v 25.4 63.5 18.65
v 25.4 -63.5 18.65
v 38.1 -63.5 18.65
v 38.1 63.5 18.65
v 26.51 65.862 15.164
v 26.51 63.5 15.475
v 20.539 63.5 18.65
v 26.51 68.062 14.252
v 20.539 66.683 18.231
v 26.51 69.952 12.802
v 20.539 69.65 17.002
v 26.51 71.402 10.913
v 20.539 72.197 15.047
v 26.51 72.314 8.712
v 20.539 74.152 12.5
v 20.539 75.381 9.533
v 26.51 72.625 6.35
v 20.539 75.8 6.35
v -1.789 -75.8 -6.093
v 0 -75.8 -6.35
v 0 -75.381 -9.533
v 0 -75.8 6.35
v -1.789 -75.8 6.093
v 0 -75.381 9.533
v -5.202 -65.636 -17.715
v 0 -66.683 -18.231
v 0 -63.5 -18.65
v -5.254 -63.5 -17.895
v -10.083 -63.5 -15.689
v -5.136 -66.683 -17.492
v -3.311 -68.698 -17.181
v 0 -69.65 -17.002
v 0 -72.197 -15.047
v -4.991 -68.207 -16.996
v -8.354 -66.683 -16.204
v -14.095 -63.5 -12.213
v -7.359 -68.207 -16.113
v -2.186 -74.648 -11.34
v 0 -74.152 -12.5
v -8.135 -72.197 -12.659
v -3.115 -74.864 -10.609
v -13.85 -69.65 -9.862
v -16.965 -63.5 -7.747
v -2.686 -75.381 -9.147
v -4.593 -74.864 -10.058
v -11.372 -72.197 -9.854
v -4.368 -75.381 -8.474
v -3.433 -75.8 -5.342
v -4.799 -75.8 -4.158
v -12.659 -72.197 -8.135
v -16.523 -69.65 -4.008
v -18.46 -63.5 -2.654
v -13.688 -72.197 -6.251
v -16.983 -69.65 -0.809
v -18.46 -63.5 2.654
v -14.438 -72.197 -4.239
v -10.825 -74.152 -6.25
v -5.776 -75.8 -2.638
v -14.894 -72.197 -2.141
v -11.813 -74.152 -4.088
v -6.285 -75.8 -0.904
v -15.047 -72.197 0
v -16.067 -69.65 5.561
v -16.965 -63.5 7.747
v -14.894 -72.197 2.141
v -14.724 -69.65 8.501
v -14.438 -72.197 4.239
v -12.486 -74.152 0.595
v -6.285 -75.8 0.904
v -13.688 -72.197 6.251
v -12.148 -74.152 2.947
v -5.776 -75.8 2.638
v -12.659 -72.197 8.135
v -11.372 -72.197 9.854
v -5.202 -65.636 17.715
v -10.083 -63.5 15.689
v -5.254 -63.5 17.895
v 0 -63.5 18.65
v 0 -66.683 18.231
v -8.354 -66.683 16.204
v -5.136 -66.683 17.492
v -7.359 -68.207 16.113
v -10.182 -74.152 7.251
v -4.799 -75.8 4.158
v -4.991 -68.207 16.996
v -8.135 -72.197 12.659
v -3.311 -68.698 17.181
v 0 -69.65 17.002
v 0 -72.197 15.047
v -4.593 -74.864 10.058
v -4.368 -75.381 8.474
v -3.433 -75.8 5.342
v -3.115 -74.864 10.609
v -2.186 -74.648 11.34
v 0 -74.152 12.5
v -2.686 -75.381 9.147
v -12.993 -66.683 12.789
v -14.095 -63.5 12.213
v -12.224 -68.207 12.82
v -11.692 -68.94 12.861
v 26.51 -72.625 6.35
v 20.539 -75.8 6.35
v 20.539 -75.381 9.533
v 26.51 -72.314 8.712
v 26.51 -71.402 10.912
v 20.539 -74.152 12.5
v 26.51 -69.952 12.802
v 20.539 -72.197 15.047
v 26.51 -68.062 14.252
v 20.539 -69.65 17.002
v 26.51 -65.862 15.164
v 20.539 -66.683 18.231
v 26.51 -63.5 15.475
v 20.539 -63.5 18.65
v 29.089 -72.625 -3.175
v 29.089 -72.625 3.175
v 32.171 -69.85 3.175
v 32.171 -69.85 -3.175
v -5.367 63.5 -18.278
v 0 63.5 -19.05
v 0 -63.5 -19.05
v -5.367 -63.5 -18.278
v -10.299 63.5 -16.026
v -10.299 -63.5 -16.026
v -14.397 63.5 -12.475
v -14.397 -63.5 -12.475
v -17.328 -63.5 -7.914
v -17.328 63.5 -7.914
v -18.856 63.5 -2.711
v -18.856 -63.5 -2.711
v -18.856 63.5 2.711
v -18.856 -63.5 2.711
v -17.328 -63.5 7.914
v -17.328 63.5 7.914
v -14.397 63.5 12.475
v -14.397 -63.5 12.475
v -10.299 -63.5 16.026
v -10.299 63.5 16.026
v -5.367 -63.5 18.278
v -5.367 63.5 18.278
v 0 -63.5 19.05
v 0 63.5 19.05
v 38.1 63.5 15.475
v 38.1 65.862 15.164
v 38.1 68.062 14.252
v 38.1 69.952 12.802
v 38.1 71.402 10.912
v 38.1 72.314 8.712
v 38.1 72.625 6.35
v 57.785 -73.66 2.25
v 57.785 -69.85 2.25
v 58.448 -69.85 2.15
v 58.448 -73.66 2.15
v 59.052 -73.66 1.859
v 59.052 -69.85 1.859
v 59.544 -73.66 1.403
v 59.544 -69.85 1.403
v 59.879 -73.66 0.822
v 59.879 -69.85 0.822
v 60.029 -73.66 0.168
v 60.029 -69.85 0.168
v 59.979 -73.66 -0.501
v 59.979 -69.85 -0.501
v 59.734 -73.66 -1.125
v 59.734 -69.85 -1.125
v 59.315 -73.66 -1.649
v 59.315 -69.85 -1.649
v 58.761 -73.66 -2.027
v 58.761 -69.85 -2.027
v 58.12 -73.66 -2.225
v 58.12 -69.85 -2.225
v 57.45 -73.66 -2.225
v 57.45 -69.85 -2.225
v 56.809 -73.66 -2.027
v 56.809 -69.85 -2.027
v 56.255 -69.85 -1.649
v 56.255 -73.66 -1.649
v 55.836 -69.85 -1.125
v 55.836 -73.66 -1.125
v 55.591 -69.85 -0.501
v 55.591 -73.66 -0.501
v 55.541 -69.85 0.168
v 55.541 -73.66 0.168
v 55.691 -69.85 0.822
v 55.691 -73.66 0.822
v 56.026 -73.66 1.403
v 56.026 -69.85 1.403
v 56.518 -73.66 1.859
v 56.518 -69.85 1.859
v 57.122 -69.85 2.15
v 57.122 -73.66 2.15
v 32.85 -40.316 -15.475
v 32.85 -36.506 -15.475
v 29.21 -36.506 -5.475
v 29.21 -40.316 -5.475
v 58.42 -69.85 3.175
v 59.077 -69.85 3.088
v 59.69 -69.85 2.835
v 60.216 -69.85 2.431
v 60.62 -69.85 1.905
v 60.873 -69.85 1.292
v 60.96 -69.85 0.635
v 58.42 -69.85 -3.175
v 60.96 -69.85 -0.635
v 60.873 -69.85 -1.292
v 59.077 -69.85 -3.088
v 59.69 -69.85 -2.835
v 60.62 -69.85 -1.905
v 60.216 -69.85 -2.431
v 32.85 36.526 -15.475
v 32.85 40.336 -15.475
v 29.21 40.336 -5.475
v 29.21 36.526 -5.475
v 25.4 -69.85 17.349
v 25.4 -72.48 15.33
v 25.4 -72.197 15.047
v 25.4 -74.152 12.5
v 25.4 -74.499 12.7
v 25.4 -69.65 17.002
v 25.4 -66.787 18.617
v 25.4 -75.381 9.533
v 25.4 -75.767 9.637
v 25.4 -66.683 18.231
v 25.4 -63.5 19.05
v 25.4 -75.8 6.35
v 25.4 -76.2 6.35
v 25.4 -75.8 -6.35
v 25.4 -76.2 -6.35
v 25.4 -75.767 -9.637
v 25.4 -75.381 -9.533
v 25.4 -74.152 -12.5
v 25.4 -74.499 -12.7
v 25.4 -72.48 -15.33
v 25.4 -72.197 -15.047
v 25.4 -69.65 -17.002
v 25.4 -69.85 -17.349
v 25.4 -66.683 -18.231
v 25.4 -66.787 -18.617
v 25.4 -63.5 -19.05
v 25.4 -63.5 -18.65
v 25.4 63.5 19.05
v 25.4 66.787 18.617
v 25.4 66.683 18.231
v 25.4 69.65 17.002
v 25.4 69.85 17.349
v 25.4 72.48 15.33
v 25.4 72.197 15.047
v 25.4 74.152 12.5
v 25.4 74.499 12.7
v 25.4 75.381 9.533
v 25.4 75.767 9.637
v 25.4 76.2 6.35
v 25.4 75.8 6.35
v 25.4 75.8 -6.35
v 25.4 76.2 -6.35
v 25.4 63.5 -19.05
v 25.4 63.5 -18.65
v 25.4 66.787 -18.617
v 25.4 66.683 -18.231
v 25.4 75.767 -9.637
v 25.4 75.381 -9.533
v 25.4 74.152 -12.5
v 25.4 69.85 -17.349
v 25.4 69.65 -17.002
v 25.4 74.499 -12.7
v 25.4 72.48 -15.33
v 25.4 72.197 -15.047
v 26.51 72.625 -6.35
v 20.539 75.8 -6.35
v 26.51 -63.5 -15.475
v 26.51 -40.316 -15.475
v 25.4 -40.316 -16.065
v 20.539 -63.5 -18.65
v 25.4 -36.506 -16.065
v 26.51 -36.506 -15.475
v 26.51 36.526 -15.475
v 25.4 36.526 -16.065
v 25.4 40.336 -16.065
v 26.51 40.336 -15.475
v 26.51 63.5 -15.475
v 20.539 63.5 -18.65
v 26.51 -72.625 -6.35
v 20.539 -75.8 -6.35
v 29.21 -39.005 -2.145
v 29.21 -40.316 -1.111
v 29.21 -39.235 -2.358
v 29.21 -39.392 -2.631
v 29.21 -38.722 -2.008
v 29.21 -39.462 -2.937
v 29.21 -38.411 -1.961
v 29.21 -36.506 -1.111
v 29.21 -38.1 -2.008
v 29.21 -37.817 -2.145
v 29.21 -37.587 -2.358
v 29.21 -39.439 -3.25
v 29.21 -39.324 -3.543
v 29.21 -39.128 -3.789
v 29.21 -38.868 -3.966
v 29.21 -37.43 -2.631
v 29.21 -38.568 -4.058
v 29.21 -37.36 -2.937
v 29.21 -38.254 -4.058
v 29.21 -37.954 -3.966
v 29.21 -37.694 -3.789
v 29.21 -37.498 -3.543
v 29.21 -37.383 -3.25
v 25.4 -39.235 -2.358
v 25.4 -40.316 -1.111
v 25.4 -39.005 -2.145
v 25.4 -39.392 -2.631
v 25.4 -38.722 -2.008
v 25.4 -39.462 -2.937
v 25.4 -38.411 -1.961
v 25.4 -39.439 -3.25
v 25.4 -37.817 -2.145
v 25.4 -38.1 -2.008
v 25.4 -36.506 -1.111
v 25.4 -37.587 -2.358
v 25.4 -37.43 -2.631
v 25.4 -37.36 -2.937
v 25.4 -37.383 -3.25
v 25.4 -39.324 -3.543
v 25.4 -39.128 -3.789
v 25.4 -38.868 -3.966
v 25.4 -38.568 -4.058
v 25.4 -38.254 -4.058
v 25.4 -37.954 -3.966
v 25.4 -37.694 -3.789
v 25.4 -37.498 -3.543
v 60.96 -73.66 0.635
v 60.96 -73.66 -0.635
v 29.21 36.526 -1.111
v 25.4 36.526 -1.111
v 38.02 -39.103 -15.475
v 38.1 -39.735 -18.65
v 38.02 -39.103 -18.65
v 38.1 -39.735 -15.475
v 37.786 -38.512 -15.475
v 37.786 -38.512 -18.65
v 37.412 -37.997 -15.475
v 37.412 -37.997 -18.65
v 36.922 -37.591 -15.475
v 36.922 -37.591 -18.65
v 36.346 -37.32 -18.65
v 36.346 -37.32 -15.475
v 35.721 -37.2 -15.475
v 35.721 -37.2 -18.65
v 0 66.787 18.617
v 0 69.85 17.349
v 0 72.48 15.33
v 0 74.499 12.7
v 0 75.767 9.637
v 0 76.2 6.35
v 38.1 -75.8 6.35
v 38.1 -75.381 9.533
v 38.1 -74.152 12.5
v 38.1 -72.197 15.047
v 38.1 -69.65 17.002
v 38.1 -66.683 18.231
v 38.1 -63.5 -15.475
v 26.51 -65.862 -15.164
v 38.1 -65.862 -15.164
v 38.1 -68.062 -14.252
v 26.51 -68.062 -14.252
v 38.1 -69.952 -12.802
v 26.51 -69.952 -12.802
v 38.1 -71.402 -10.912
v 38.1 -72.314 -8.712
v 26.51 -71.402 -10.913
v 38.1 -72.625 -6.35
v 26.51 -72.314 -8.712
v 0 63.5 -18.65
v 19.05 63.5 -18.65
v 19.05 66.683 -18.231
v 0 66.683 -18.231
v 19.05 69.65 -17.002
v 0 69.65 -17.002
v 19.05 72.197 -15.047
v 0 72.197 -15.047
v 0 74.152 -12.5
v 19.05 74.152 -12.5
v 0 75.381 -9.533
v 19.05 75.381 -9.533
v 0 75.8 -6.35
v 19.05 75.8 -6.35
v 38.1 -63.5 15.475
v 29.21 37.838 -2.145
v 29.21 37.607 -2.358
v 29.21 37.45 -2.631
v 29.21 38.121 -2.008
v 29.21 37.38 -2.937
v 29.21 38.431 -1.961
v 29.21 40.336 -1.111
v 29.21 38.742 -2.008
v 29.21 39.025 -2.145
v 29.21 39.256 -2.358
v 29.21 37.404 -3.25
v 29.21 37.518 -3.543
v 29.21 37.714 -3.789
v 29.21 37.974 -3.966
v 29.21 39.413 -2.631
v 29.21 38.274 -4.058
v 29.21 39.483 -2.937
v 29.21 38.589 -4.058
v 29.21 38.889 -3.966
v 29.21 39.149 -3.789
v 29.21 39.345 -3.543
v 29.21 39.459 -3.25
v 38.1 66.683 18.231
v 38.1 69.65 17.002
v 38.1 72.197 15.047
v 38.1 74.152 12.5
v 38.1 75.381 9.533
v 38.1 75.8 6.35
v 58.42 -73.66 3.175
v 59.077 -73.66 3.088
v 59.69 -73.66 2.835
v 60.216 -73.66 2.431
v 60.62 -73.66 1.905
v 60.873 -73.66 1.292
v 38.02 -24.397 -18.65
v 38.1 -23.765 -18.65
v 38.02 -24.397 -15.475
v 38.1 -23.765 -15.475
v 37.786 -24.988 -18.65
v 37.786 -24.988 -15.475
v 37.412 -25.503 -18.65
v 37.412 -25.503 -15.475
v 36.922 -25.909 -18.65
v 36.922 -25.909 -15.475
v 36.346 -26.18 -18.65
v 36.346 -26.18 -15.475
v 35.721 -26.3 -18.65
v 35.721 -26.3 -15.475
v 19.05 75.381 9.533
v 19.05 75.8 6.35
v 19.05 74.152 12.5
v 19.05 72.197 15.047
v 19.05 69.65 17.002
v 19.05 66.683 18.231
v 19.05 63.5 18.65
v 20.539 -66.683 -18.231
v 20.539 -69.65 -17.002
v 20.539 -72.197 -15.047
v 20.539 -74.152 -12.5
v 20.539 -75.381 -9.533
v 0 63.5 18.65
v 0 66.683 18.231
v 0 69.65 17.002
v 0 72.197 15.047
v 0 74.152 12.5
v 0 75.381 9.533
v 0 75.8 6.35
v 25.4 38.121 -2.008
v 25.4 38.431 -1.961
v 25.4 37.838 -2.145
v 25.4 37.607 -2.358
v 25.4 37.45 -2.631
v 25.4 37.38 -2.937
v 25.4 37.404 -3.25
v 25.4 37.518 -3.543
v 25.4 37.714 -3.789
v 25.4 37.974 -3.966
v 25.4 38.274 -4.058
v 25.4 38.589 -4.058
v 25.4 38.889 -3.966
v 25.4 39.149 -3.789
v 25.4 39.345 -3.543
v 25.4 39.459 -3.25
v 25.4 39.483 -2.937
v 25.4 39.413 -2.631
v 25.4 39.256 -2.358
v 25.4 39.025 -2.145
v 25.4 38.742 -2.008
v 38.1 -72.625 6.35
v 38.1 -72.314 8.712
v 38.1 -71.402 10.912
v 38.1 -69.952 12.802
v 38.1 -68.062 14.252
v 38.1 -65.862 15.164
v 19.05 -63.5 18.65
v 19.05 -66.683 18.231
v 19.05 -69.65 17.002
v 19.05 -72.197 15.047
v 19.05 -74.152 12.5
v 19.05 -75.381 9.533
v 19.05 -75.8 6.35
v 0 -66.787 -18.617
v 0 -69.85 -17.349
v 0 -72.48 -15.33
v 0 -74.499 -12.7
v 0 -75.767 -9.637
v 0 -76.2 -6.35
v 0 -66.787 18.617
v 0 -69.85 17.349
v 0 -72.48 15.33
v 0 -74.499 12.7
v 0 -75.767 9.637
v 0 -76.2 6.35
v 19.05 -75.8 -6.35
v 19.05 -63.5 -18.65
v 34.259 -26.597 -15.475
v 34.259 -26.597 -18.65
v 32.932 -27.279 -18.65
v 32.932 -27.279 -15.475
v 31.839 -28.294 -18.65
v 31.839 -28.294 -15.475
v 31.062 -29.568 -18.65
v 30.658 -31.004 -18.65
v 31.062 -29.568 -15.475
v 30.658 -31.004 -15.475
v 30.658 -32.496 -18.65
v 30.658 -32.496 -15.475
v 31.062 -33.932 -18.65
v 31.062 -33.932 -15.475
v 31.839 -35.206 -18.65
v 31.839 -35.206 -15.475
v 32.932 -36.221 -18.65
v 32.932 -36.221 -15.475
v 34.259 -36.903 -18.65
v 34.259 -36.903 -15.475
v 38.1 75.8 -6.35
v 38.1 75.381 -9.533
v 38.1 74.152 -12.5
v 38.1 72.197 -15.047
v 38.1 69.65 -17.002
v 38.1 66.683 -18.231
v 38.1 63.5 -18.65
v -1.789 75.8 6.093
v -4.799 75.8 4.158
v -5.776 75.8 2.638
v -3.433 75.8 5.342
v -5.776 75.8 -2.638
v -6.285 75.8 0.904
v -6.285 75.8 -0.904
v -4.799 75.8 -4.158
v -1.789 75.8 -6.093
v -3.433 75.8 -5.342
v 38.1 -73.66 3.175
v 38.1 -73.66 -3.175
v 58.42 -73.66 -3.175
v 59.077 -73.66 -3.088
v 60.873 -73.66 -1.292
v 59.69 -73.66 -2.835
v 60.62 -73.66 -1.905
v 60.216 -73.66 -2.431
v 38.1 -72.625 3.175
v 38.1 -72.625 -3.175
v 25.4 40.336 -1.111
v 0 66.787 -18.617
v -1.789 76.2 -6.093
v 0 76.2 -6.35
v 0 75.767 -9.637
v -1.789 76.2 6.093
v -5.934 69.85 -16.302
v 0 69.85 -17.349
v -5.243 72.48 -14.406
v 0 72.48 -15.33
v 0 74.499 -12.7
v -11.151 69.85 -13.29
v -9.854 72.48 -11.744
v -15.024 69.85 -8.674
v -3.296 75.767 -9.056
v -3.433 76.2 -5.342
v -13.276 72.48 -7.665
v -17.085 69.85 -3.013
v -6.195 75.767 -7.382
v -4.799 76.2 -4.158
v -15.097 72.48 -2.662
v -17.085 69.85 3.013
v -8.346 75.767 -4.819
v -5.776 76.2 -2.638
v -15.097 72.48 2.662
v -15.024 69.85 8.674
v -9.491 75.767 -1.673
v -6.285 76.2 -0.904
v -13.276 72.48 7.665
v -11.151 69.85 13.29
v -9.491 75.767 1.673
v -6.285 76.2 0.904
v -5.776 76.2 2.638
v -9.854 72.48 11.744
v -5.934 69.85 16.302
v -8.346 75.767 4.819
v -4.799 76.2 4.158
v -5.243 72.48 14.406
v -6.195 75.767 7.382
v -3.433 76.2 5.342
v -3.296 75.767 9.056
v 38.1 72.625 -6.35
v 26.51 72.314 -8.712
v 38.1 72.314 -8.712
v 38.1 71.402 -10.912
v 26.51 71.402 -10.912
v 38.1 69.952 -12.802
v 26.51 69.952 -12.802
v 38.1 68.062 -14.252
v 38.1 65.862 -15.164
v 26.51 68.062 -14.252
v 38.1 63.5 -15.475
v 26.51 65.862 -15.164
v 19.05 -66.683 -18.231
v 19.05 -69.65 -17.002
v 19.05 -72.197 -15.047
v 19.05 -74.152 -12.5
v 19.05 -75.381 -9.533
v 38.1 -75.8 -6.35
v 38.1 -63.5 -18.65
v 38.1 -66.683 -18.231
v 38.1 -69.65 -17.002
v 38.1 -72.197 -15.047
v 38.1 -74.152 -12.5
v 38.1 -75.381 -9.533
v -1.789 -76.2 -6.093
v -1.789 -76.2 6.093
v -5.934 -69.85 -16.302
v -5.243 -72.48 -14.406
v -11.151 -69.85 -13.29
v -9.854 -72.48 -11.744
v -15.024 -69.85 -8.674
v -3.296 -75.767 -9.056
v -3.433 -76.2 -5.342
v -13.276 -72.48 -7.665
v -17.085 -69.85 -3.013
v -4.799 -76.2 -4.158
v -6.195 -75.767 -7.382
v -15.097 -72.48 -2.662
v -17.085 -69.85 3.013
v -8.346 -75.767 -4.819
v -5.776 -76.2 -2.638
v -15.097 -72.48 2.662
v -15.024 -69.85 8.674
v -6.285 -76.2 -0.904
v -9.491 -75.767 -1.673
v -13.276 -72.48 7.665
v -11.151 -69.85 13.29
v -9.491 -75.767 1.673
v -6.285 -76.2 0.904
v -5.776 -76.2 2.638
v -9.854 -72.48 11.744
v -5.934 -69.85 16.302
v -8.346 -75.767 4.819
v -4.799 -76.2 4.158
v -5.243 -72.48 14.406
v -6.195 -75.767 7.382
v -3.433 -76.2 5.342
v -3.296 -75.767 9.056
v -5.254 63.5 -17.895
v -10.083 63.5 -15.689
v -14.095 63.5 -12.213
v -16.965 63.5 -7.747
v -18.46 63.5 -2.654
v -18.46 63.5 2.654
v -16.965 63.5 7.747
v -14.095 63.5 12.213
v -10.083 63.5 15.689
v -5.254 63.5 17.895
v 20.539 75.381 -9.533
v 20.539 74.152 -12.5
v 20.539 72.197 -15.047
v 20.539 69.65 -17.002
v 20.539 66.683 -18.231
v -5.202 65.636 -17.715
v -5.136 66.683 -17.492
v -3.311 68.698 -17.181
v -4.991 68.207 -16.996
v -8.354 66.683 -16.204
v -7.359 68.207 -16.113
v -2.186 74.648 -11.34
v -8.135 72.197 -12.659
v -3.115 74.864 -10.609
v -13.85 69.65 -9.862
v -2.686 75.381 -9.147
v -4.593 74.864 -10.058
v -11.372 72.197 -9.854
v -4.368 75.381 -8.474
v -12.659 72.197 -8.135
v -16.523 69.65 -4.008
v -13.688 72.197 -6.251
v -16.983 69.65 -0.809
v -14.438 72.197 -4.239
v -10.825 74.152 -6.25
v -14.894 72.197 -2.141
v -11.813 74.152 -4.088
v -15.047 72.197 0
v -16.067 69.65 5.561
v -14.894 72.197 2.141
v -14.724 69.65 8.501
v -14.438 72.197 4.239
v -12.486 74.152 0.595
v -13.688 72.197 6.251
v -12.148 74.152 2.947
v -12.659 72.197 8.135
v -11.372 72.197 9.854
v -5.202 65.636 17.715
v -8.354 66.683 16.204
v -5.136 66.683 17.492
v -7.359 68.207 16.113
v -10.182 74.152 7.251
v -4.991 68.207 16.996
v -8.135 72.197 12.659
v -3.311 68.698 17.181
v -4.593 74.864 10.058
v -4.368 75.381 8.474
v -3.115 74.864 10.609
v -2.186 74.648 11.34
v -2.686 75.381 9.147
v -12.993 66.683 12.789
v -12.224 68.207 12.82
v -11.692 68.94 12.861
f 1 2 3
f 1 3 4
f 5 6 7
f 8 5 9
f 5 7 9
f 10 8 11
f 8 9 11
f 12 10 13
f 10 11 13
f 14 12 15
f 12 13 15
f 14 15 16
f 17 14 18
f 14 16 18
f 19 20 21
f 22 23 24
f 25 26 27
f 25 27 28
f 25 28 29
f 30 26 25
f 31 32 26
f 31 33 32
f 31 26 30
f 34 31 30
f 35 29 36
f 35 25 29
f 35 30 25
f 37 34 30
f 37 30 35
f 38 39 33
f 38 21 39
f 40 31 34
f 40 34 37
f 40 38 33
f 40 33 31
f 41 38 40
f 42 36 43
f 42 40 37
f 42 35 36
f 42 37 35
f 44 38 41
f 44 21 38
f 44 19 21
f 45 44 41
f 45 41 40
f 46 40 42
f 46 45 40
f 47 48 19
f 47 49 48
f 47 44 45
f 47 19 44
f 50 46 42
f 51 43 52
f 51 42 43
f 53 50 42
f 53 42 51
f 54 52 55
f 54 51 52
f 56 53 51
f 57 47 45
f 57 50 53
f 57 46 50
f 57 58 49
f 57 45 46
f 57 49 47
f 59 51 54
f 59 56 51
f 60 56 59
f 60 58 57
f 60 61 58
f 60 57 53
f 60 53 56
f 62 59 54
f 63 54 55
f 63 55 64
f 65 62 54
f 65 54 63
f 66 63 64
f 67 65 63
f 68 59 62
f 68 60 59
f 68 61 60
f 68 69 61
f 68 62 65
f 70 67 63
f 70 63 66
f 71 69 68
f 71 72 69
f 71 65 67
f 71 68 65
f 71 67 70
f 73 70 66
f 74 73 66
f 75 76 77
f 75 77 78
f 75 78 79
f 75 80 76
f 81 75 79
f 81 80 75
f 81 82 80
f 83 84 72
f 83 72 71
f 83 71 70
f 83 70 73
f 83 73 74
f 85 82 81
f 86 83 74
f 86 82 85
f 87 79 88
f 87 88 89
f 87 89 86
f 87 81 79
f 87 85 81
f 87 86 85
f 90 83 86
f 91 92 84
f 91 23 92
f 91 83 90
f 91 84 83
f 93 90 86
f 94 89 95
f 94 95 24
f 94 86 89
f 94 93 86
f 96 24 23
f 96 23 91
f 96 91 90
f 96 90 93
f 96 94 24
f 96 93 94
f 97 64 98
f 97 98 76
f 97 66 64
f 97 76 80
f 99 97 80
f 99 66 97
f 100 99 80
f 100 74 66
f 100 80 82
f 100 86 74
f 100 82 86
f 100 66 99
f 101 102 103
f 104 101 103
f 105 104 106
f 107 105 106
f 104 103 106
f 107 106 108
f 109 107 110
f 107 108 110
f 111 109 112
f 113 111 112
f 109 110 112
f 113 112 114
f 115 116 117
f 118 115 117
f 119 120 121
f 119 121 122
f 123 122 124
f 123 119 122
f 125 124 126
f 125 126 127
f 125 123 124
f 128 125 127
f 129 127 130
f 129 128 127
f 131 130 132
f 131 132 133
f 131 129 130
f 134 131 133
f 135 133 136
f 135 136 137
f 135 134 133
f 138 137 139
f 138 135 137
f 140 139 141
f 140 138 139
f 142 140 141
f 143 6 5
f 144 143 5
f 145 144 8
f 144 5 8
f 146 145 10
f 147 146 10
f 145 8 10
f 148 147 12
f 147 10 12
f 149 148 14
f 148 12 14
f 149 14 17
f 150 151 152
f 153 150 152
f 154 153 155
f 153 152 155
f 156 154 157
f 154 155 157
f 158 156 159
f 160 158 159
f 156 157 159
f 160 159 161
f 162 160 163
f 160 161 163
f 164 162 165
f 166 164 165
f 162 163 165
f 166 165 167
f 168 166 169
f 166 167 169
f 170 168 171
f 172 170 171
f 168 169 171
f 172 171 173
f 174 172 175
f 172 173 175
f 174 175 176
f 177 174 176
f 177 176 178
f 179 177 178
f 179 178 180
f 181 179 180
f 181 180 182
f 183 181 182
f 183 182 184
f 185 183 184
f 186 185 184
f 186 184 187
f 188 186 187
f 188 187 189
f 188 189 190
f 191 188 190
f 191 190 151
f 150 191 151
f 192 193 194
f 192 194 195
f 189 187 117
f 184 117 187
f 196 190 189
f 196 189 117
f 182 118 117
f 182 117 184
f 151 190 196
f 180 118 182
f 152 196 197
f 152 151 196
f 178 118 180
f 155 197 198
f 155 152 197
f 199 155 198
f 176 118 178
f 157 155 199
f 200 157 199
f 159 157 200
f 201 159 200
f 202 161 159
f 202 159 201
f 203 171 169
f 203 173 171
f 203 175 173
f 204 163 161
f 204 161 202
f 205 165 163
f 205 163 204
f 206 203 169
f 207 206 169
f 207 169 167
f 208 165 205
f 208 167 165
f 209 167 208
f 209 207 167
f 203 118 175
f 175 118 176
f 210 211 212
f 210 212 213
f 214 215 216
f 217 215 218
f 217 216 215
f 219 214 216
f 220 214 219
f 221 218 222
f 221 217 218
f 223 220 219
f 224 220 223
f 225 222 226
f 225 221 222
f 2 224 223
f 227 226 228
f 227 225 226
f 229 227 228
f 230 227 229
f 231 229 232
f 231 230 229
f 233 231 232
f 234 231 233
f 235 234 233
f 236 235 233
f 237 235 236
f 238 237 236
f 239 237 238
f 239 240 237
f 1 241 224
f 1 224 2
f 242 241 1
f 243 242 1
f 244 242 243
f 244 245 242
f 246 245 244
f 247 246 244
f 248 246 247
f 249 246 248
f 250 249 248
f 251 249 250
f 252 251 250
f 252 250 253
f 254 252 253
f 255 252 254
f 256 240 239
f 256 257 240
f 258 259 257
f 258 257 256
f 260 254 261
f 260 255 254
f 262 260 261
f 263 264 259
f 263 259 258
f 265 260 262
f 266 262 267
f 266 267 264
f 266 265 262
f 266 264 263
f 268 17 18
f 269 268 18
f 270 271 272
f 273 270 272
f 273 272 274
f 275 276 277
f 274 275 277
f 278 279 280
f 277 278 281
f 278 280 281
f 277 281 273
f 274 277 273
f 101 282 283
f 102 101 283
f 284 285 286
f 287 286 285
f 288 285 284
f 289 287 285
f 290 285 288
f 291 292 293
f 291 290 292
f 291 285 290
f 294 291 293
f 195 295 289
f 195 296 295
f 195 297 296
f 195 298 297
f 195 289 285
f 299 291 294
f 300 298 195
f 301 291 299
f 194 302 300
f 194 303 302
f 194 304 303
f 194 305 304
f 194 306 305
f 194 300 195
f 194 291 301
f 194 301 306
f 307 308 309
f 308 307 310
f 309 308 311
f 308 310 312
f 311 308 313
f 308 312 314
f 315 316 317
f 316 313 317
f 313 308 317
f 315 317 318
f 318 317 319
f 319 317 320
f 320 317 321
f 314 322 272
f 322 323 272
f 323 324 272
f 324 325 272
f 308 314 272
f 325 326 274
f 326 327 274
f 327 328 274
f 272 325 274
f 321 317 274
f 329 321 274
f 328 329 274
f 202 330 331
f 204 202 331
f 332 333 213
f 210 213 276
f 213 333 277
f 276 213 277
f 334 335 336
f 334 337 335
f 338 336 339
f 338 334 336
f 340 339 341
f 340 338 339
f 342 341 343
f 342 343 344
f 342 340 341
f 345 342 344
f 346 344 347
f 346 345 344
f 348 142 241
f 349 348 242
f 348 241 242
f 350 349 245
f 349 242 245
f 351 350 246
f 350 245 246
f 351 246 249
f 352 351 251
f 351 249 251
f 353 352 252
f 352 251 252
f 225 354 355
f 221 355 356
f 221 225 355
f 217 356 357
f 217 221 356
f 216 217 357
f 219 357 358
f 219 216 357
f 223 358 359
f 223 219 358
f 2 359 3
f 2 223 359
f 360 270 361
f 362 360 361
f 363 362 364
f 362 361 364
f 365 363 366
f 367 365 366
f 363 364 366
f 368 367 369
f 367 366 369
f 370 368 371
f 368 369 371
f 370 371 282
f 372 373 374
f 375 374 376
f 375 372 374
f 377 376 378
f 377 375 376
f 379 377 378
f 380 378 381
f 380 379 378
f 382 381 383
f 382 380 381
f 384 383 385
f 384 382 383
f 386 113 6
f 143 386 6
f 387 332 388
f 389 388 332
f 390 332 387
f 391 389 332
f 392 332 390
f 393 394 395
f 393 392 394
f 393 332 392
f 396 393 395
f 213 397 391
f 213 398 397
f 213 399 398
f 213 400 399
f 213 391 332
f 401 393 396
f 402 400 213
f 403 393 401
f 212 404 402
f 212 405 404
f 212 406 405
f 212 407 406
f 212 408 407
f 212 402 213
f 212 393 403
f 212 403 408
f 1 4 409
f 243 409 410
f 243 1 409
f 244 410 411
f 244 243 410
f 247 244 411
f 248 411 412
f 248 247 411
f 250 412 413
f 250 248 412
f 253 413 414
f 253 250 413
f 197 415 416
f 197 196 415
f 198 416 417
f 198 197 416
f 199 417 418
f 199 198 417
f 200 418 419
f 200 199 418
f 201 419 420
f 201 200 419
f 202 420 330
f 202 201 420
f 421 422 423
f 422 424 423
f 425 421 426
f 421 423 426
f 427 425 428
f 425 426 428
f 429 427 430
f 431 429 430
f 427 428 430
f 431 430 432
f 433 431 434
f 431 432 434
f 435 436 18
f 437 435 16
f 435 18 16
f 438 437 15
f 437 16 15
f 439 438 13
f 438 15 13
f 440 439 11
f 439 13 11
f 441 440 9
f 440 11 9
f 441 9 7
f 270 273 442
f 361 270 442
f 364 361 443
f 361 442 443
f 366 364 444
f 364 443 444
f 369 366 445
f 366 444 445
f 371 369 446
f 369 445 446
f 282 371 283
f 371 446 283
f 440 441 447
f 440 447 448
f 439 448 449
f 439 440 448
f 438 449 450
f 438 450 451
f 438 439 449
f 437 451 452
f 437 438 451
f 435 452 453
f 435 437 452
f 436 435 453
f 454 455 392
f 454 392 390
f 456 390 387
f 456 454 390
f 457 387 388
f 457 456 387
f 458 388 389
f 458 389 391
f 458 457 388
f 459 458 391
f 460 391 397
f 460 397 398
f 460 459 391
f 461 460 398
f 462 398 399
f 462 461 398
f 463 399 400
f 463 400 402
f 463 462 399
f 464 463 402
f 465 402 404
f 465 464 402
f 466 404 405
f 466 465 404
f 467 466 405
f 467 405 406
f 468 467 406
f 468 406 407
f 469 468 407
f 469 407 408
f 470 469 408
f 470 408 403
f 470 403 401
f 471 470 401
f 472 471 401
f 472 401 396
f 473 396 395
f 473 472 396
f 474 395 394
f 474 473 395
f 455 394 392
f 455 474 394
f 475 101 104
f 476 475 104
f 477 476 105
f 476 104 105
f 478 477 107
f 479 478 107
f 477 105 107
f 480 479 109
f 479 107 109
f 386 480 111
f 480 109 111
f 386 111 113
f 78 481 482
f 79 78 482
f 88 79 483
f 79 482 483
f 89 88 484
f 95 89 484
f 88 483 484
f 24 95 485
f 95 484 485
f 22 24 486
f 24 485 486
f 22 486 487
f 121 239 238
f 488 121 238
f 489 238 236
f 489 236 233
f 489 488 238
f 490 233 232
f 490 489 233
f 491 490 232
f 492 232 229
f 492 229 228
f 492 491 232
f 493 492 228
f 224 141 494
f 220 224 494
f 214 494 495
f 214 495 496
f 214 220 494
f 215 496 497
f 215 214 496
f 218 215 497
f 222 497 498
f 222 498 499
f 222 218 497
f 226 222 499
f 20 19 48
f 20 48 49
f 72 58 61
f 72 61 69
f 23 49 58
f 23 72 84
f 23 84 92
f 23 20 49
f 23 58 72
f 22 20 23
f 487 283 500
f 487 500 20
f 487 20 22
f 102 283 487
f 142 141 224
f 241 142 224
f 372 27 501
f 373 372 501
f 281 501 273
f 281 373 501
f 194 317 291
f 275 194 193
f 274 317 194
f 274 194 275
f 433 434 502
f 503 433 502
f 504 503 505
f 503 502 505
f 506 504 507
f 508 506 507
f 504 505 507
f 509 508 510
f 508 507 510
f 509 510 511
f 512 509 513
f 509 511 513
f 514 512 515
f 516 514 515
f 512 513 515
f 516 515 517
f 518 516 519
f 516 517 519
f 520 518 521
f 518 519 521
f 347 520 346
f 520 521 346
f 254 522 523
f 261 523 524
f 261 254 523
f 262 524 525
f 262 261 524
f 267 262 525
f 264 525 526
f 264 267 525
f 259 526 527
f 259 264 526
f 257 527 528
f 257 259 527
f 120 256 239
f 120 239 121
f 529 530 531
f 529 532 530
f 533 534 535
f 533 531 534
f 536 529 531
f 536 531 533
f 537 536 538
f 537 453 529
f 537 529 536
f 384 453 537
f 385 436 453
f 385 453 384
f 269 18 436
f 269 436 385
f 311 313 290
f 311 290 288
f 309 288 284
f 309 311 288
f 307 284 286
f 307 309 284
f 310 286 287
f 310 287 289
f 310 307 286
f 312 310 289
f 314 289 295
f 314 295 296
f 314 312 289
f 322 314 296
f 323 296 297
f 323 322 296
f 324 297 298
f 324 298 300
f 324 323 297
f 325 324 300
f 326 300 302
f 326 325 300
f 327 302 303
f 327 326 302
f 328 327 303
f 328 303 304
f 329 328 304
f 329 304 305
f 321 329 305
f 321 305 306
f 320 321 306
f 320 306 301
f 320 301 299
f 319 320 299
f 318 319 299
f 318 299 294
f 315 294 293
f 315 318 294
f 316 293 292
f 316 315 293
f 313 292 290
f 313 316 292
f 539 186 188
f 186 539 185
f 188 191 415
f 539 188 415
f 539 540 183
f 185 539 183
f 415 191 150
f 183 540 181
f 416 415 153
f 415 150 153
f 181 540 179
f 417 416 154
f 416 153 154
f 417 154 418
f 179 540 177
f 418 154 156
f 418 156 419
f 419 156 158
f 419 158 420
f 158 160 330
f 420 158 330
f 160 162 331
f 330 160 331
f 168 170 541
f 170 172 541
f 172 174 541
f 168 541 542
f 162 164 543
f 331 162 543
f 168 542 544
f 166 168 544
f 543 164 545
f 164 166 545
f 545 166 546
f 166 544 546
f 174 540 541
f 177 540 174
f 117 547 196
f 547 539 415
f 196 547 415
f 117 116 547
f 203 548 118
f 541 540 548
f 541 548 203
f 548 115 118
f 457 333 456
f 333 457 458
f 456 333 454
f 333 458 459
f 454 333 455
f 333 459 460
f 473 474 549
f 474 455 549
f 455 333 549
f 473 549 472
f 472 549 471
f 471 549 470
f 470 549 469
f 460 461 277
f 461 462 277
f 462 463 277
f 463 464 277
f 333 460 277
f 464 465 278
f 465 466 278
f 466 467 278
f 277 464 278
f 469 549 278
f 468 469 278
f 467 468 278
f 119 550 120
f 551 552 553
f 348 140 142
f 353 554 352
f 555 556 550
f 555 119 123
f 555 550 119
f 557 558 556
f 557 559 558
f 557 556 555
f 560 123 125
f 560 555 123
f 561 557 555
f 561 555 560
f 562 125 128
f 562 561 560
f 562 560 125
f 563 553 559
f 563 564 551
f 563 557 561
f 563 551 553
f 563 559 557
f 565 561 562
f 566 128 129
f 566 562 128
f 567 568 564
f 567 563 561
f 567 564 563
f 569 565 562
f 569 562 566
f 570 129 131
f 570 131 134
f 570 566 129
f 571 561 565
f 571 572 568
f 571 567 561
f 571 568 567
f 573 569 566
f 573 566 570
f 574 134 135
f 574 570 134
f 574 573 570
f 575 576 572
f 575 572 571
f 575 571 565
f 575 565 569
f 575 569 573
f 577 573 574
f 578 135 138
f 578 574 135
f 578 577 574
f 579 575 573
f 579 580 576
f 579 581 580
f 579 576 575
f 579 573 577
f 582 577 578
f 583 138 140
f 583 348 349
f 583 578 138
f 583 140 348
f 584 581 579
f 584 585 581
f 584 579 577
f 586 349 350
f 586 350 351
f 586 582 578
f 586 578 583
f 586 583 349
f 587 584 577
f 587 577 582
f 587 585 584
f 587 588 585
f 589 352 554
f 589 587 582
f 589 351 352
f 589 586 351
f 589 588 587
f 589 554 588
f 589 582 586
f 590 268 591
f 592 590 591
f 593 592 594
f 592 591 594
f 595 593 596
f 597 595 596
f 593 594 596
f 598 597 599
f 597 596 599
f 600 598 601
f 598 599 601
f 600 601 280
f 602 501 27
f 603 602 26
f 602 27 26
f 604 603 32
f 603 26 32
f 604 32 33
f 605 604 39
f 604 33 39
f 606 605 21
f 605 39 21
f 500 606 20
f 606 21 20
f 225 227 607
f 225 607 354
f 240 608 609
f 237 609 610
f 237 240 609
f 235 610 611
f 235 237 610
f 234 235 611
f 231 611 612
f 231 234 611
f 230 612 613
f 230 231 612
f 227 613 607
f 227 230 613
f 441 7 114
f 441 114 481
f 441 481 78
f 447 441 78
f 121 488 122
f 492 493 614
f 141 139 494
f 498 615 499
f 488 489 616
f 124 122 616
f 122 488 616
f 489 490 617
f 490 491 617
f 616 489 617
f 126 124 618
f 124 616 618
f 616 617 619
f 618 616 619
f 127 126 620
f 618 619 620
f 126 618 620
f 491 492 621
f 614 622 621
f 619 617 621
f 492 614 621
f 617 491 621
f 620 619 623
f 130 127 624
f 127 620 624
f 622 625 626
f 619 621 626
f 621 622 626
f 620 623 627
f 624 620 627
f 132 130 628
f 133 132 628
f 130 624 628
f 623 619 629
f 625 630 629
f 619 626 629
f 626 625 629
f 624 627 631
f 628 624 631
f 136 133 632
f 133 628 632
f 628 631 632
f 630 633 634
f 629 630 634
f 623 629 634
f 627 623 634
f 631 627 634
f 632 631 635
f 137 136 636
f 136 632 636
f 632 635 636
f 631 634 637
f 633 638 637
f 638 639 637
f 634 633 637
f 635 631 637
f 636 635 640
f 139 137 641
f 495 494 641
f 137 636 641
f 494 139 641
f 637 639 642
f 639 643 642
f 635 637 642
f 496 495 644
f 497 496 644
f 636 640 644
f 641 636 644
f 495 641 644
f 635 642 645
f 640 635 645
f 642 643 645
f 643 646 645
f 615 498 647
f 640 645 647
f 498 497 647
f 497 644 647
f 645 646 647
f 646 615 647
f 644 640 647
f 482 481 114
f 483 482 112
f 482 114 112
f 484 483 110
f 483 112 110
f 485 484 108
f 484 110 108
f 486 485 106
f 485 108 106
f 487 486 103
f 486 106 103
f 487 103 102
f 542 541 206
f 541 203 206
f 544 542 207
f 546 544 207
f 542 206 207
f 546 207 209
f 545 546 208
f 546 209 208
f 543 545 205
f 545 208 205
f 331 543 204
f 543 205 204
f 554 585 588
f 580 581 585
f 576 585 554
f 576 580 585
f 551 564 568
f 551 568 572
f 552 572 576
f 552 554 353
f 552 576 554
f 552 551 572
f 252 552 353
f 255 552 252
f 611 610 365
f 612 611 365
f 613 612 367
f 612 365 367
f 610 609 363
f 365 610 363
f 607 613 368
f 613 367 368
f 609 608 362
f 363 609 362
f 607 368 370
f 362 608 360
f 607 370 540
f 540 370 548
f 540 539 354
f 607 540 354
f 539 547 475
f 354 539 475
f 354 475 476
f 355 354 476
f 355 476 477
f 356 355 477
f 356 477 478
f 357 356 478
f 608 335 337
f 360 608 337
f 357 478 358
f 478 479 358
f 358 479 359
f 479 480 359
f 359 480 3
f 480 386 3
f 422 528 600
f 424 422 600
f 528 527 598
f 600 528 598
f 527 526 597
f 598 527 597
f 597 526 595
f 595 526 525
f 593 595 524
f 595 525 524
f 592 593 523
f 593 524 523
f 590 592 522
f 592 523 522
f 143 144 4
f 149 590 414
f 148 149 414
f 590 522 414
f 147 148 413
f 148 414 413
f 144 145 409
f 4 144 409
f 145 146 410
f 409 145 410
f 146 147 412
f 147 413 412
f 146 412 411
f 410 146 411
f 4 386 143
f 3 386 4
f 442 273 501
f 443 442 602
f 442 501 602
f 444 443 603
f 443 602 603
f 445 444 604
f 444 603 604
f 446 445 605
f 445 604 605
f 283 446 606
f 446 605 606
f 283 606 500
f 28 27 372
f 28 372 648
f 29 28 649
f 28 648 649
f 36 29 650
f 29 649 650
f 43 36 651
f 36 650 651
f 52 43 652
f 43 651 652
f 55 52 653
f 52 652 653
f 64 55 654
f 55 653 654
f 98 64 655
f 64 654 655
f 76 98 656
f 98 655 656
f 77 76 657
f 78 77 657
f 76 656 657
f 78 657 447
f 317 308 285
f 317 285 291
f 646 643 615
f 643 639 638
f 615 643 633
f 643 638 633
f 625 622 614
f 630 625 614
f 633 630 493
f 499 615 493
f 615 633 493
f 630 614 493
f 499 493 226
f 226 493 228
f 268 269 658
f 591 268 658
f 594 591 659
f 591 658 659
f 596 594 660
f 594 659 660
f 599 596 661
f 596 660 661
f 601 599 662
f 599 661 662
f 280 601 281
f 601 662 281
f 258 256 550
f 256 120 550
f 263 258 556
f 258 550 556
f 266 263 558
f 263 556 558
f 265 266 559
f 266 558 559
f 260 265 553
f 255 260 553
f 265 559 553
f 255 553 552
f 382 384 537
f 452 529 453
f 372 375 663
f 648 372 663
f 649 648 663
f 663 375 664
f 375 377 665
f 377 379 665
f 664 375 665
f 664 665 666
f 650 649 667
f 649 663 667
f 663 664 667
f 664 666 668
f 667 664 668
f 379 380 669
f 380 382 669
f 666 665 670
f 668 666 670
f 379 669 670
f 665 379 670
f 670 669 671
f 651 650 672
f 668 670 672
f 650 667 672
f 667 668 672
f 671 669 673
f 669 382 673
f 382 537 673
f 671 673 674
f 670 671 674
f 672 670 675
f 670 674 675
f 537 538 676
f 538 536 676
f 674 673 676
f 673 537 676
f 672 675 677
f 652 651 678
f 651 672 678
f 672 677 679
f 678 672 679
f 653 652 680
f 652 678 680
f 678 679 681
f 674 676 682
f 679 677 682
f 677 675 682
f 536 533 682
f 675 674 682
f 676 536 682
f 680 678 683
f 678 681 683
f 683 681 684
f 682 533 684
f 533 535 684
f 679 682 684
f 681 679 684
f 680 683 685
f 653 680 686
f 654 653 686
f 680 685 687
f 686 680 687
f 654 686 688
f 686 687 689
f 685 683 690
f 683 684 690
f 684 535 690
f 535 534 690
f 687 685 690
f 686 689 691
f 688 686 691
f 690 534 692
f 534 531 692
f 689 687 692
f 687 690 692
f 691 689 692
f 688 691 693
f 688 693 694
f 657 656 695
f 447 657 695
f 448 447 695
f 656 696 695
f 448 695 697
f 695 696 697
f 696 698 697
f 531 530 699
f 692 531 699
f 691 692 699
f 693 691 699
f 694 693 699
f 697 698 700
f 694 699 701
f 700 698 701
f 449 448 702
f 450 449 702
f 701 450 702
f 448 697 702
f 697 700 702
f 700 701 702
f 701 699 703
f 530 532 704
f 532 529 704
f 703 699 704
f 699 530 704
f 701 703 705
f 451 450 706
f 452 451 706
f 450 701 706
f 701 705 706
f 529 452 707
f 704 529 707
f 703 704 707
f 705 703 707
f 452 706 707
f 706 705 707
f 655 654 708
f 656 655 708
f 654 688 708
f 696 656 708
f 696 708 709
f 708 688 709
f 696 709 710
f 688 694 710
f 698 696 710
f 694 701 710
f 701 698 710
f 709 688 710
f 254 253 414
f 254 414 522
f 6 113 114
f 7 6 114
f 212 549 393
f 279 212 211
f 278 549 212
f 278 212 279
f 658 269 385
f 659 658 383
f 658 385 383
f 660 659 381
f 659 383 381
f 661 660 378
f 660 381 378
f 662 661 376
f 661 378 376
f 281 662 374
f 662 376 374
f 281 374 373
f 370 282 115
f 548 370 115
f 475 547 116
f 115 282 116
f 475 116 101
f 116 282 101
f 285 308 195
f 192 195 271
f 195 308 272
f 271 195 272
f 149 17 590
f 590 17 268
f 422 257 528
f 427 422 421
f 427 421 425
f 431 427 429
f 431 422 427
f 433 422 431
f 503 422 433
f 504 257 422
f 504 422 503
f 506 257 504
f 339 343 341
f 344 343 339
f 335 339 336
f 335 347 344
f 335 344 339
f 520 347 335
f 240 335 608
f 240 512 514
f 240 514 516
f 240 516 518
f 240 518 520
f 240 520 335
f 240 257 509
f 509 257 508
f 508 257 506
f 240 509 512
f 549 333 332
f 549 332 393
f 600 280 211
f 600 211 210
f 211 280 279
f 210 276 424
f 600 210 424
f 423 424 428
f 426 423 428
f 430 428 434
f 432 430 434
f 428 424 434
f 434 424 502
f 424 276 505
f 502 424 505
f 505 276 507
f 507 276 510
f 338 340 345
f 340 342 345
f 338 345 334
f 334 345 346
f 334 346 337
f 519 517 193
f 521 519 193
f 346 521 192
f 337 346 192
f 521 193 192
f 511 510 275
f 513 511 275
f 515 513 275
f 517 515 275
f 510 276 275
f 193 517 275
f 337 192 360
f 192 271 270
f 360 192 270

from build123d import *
from OCP.BRepFilletAPI import BRepFilletAPI_MakeChamfer

# Parameters (mm, degrees)
BOSS_EXTRUDE1_DEPTH      = 76.2
FILLET1_R                = 12.7
SHELL1_T                 = -0.4
EXTRUDE_THIN1_DEPTH      = 12.7
EXTRUDE_THIN1_DEPTH_BACK = 6.35
CHAMFER1_SIZE            = 7.46
CHAMFER1_SIZE_2          = 3.96655236
SKETCH6_W                = 17.539309582
SKETCH6_H                = 3.81
SKETCH6_R                = 1.054294776
BOSS_EXTRUDE3_DEPTH      = 3.81
CHAMFER2_SIZE            = 10
CHAMFER2_SIZE2           = 3.639702343
SKETCH7_W                = 33.02
SKETCH7_H                = 6.35
BOSS_EXTRUDE4_DEPTH      = 3.81
CHAMFER3_SIZE            = 3.81
CHAMFER3_SIZE_2          = 4.231433681
SKETCH8_R                = 2.25
CUT_EXTRUDE1_DEPTH       = 160.403972974
FILLET2_R                = 2.54
SKETCH9_R                = 5.461
CUT_EXTRUDE2_DEPTH       = 104.511048806
FILLET3_R                = 2.54


with BuildPart() as part:
    # Sketch1 → Boss-Extrude1 (new, symmetric)
    with BuildSketch(Plane(origin=(0, 0, 0), x_dir=(1, 0, 0), z_dir=(0, 1, 0))):
        with BuildLine():
            Line((0, -19.05), (25.4, -19.05))
            Line((25.4, -19.05), (25.4, 19.05))
            Line((25.4, 19.05), (0, 19.05))
            ThreePointArc((0, 19.05), (-19.05, 0), (0, -19.05))
        make_face()
    extrude(amount=BOSS_EXTRUDE1_DEPTH, both=True)

    # Fillet1
    fillet1_edges = [part.edges().sort_by_distance(p)[0] for p in [
        (12.7, 76.2, -19.05),
        (-19.05, 76.2, 0),
        (12.7, -76.2, -19.05),
        (12.7, -76.2, 19.05),
        (-19.05, -76.2, 0),
        (12.7, 76.2, 19.05),
    ]]
    fillet(fillet1_edges, radius=FILLET1_R)

    # Shell1
    shell1_openings = [part.faces().sort_by_distance(p)[0] for p in [
        (25.4, 0, 0),
    ]]
    offset(amount=SHELL1_T, openings=shell1_openings, kind=Kind.INTERSECTION)

    # Sketch4 → Extrude-Thin1 (add, two sides: drawn at the far end of the back side and taken through both)
    with BuildSketch(Plane(origin=(25.4, 0, 0), x_dir=(0, 0, -1), z_dir=(1, 0, 0)).offset(-EXTRUDE_THIN1_DEPTH_BACK)):
        with BuildLine():
            Line((18.65, 63.5), (18.65, -63.5))
            ThreePointArc((18.65, -63.5), (15.047413409, -72.197413409), (6.35, -75.8))
            Line((6.35, -75.8), (-6.35, -75.8))
            ThreePointArc((-6.35, -75.8), (-15.047413409, -72.197413409), (-18.65, -63.5))
            Line((-18.65, -63.5), (-18.65, 63.5))
            ThreePointArc((-18.65, 63.5), (-15.047413409, 72.197413409), (-6.35, 75.8))
            Line((-6.35, 75.8), (6.35, 75.8))
            ThreePointArc((6.35, 75.8), (15.047413409, 72.197413409), (18.65, 63.5))
        make_face()
        with BuildLine():
            Line((15.475, 63.5), (15.475, -63.5))
            ThreePointArc((15.475, -63.5), (12.802349378, -69.952349378), (6.35, -72.625))
            Line((6.35, -72.625), (-6.35, -72.625))
            ThreePointArc((-6.35, -72.625), (-12.802349378, -69.952349378), (-15.475, -63.5))
            Line((-15.475, -63.5), (-15.475, 63.5))
            ThreePointArc((-15.475, 63.5), (-12.802349378, 69.952349378), (-6.35, 72.625))
            Line((-6.35, 72.625), (6.35, 72.625))
            ThreePointArc((6.35, 72.625), (12.802349378, 69.952349378), (15.475, 63.5))
        make_face(mode=Mode.SUBTRACT)
    extrude(amount=EXTRUDE_THIN1_DEPTH + EXTRUDE_THIN1_DEPTH_BACK)

    # Chamfer1
    # the kernel refuses this chamfer: 7.46, 3.96655236 mm, written as the material it takes off along each edge
    with BuildSketch(Plane(origin=(19.05, 63.5, -15.475), x_dir=(0.9998355423896509, 0, 0.01813527431257697), z_dir=(0, -1, 0))) as chamfer1_piece_1_section:
        Polygon((CHAMFER1_SIZE * 0.99983554239, -CHAMFER1_SIZE * 0.0181352743126), (-CHAMFER1_SIZE_2 * 0.0181352743135, -CHAMFER1_SIZE_2 * 0.999835542439), (0, 0), align=None)
    chamfer1_piece_1 = extrude(amount=127, mode=Mode.PRIVATE)
    chamfer1_piece_1 = split(chamfer1_piece_1, bisect_by=Plane(origin=(21.815261342, 60.108381876, -18.65), z_dir=(0, 0, 1)), keep=Keep.TOP, mode=Mode.PRIVATE)
    add(chamfer1_piece_1, mode=Mode.SUBTRACT)
    with BuildSketch(Plane(origin=(19.05, 63.5, -6.35), x_dir=(0, 1, 0), z_dir=(0, 0, 1))) as chamfer1_piece_2_section:
        Polygon((9.125, -CHAMFER1_SIZE), (9.125 + CHAMFER1_SIZE_2, 0), (9.125, 0), align=None)
    chamfer1_piece_2 = revolve(axis=Axis((19.05, 63.5, -6.35), (-1, 0, 0)), revolution_arc=90, mode=Mode.PRIVATE)
    chamfer1_piece_2 = chamfer1_piece_2 & Plane(origin=(21.967036343, 63.5, -6.35), x_dir=(0, 0, -1), z_dir=(-1, 0, 0)) * Cylinder(12.3, 53, mode=Mode.PRIVATE)
    add(chamfer1_piece_2, mode=Mode.SUBTRACT)
    with BuildSketch(Plane(origin=(19.05, -63.5, -6.35), x_dir=(0, 0, -1), z_dir=(0, 1, 0))) as chamfer1_piece_3_section:
        Polygon((9.125, -CHAMFER1_SIZE), (9.125 + CHAMFER1_SIZE_2, 0), (9.125, 0), align=None)
    chamfer1_piece_3 = revolve(axis=Axis((19.05, -63.5, -6.35), (-1, 0, 0)), revolution_arc=90, mode=Mode.PRIVATE)
    chamfer1_piece_3 = chamfer1_piece_3 & Plane(origin=(21.967036343, -63.5, -6.35), x_dir=(0, 0, -1), z_dir=(-1, 0, 0)) * Cylinder(12.3, 53, mode=Mode.PRIVATE)
    add(chamfer1_piece_3, mode=Mode.SUBTRACT)
    with BuildSketch(Plane(origin=(19.05, 72.625, 6.35), x_dir=(0.9998355423896509, -0.01813527431257697, 0), z_dir=(0, 0, -1))) as chamfer1_piece_4_section:
        Polygon((CHAMFER1_SIZE * 0.99983554239, -CHAMFER1_SIZE * 0.0181352743126), (-CHAMFER1_SIZE_2 * 0.0181352743135, -CHAMFER1_SIZE_2 * 0.999835542439), (0, 0), align=None)
    chamfer1_piece_4 = extrude(amount=12.7, mode=Mode.PRIVATE)
    chamfer1_piece_4 = split(chamfer1_piece_4, bisect_by=Plane(origin=(21.637658595, 75.8, 3.947497634), z_dir=(0, -1, 0)), keep=Keep.TOP, mode=Mode.PRIVATE)
    add(chamfer1_piece_4, mode=Mode.SUBTRACT)
    with BuildSketch(Plane(origin=(19.05, -72.625, -6.35), x_dir=(0.9998355423896509, 0.01813527431257697, 0), z_dir=(0, 0, 1))) as chamfer1_piece_5_section:
        Polygon((CHAMFER1_SIZE * 0.99983554239, -CHAMFER1_SIZE * 0.0181352743126), (-CHAMFER1_SIZE_2 * 0.0181352743135, -CHAMFER1_SIZE_2 * 0.999835542439), (0, 0), align=None)
    chamfer1_piece_5 = extrude(amount=12.7, mode=Mode.PRIVATE)
    chamfer1_piece_5 = split(chamfer1_piece_5, bisect_by=Plane(origin=(21.637658595, -75.8, -3.947497634), z_dir=(0, 1, 0)), keep=Keep.TOP, mode=Mode.PRIVATE)
    add(chamfer1_piece_5, mode=Mode.SUBTRACT)
    with BuildSketch(Plane(origin=(19.05, 63.5, 6.35), x_dir=(0, 0, 1), z_dir=(0, -1, 0))) as chamfer1_piece_6_section:
        Polygon((9.125, -CHAMFER1_SIZE), (9.125 + CHAMFER1_SIZE_2, 0), (9.125, 0), align=None)
    chamfer1_piece_6 = revolve(axis=Axis((19.05, 63.5, 6.35), (-1, 0, 0)), revolution_arc=90, mode=Mode.PRIVATE)
    chamfer1_piece_6 = chamfer1_piece_6 & Plane(origin=(21.967036343, 63.5, 6.35), x_dir=(0, 0, 1), z_dir=(1, 0, 0)) * Cylinder(12.3, 53, mode=Mode.PRIVATE)
    add(chamfer1_piece_6, mode=Mode.SUBTRACT)
    with BuildSketch(Plane(origin=(19.05, -63.5, 6.35), x_dir=(0, -1, 0), z_dir=(0, 0, -1))) as chamfer1_piece_7_section:
        Polygon((9.125, -CHAMFER1_SIZE), (9.125 + CHAMFER1_SIZE_2, 0), (9.125, 0), align=None)
    chamfer1_piece_7 = revolve(axis=Axis((19.05, -63.5, 6.35), (-1, 0, 0)), revolution_arc=90, mode=Mode.PRIVATE)
    chamfer1_piece_7 = chamfer1_piece_7 & Plane(origin=(21.967036343, -63.5, 6.35), x_dir=(0, 0, 1), z_dir=(1, 0, 0)) * Cylinder(12.3, 53, mode=Mode.PRIVATE)
    add(chamfer1_piece_7, mode=Mode.SUBTRACT)
    with BuildSketch(Plane(origin=(19.05, -63.5, 15.475), x_dir=(0.9998355423896509, 0, -0.01813527431257697), z_dir=(0, 1, 0))) as chamfer1_piece_8_section:
        Polygon((CHAMFER1_SIZE * 0.99983554239, -CHAMFER1_SIZE * 0.0181352743126), (-CHAMFER1_SIZE_2 * 0.0181352743135, -CHAMFER1_SIZE_2 * 0.999835542439), (0, 0), align=None)
    chamfer1_piece_8 = extrude(amount=127, mode=Mode.PRIVATE)
    chamfer1_piece_8 = split(chamfer1_piece_8, bisect_by=Plane(origin=(21.815261342, -60.108381876, 18.65), z_dir=(0, 0, -1)), keep=Keep.TOP, mode=Mode.PRIVATE)
    add(chamfer1_piece_8, mode=Mode.SUBTRACT)

    # Sketch6 → Boss-Extrude3 (add)
    # profile 1 of 2: a face of its own
    with BuildSketch(Plane(origin=(25.4, 0, 0), x_dir=(0, 0, -1), z_dir=(1, 0, 0))):
        with Locations((9.880345209, 38.431496192)):
            Rectangle(SKETCH6_W, SKETCH6_H)
        with Locations(Location((3.015690418, 38.431496192, 0), (0, 0, 180))):
            Circle(SKETCH6_R, mode=Mode.SUBTRACT)
    # profile 2 of 2: a face of its own
    with BuildSketch(Plane(origin=(25.4, 0, 0), x_dir=(0, 0, -1), z_dir=(1, 0, 0))):
        with Locations((9.880345209, -38.410993514)):
            Rectangle(SKETCH6_W, SKETCH6_H)
        with Locations(Location((3.015690418, -38.410993514, 0), (0, 0, 180))):
            Circle(SKETCH6_R, mode=Mode.SUBTRACT)
    extrude(amount=BOSS_EXTRUDE3_DEPTH)

    # Chamfer2: one chamfer whose edges measure the first distance from different faces: ONE call of the kernel's chamfer builder (chamfer() names one face for all edges)
    chamfer2_edges_1 = [part.edges().sort_by_distance(p)[0] for p in [
        (29.21, -38.410993514, -15.475),
    ]]
    chamfer2_side_1 = [part.faces().sort_by_distance(p)[0] for p in [
        (29.21, -38.410993514, -8.652510406),
    ]]
    chamfer2_edges_2 = [part.edges().sort_by_distance(p)[0] for p in [
        (29.21, 38.431496192, -15.475),
    ]]
    chamfer2_side_2 = [part.faces().sort_by_distance(p)[0] for p in [
        (29.21, 38.431496192, -8.652510406),
    ]]
    chamfer2 = BRepFilletAPI_MakeChamfer(part.part.solid().wrapped)
    for e in chamfer2_edges_1:
        chamfer2.Add(CHAMFER2_SIZE, CHAMFER2_SIZE2, e.wrapped, chamfer2_side_1[0].wrapped)  # the first distance lies on this face
    for e in chamfer2_edges_2:
        chamfer2.Add(CHAMFER2_SIZE, CHAMFER2_SIZE2, e.wrapped, chamfer2_side_2[0].wrapped)  # the first distance lies on this face
    add(Compound.cast(chamfer2.Shape()), mode=Mode.REPLACE)

    # Sketch7 → Boss-Extrude4 (add)
    with BuildSketch(Plane(origin=(0, -73.66, 0), x_dir=(1, 0, 0), z_dir=(0, 1, 0))):
        with Locations((44.45, 0)):
            Rectangle(SKETCH7_W, SKETCH7_H)
    extrude(amount=BOSS_EXTRUDE4_DEPTH)

    # Chamfer3
    # the kernel refuses this chamfer: 4.231433681, 3.81 mm, written as the material it takes off along each edge
    with BuildSketch(Plane(origin=(27.94, -69.85, -3.175), x_dir=(-0.03204434000819545, -0.9994864482690294, 0), z_dir=(0, 0, 1))) as chamfer3_piece_1_section:
        Polygon((CHAMFER3_SIZE * 0.999486448269, CHAMFER3_SIZE * 0.0320443400082), (-CHAMFER3_SIZE_2 * 0.032044340012, CHAMFER3_SIZE_2 * 0.999486448387), (0, 0), align=None)
    chamfer3_piece_1 = extrude(amount=6.35, mode=Mode.PRIVATE)
    chamfer3_piece_1 = split(chamfer3_piece_1, bisect_by=Plane(origin=(28.695678786, -72.625, -2.695594609), z_dir=(0, 1, 0)), keep=Keep.TOP, mode=Mode.PRIVATE)
    add(chamfer3_piece_1, mode=Mode.SUBTRACT)

    # Sketch8 → Cut-Extrude1 (cut, through all)
    with BuildSketch(Plane(origin=(0, -69.85, 0), x_dir=(1, 0, 0), z_dir=(0, 1, 0))):
        with Locations(Location((57.785, 0, 0), (0, 0, 270))):
            Circle(SKETCH8_R)
    extrude(amount=-CUT_EXTRUDE1_DEPTH, mode=Mode.SUBTRACT)

    # Fillet2
    fillet2_edges = [part.edges().sort_by_distance(p)[0] for p in [
        (60.96, -71.755, -3.175),
        (60.96, -71.755, 3.175),
    ]]
    fillet(fillet2_edges, radius=FILLET2_R)

    # Sketch9 → Cut-Extrude2 (cut, through all)
    with BuildSketch(Plane.XY.offset(-15.475)):
        with Locations((36.068, -31.75)):
            Circle(SKETCH9_R)
    extrude(amount=-CUT_EXTRUDE2_DEPTH, mode=Mode.SUBTRACT)

    # Fillet3
    fillet3_edges = [part.edges().sort_by_distance(p)[0] for p in [
        (38.1, -26.681124681, -17.0625),
        (38.1, -36.818875319, -17.0625),
    ]]
    fillet(fillet3_edges, radius=FILLET3_R)


solid = part.part
